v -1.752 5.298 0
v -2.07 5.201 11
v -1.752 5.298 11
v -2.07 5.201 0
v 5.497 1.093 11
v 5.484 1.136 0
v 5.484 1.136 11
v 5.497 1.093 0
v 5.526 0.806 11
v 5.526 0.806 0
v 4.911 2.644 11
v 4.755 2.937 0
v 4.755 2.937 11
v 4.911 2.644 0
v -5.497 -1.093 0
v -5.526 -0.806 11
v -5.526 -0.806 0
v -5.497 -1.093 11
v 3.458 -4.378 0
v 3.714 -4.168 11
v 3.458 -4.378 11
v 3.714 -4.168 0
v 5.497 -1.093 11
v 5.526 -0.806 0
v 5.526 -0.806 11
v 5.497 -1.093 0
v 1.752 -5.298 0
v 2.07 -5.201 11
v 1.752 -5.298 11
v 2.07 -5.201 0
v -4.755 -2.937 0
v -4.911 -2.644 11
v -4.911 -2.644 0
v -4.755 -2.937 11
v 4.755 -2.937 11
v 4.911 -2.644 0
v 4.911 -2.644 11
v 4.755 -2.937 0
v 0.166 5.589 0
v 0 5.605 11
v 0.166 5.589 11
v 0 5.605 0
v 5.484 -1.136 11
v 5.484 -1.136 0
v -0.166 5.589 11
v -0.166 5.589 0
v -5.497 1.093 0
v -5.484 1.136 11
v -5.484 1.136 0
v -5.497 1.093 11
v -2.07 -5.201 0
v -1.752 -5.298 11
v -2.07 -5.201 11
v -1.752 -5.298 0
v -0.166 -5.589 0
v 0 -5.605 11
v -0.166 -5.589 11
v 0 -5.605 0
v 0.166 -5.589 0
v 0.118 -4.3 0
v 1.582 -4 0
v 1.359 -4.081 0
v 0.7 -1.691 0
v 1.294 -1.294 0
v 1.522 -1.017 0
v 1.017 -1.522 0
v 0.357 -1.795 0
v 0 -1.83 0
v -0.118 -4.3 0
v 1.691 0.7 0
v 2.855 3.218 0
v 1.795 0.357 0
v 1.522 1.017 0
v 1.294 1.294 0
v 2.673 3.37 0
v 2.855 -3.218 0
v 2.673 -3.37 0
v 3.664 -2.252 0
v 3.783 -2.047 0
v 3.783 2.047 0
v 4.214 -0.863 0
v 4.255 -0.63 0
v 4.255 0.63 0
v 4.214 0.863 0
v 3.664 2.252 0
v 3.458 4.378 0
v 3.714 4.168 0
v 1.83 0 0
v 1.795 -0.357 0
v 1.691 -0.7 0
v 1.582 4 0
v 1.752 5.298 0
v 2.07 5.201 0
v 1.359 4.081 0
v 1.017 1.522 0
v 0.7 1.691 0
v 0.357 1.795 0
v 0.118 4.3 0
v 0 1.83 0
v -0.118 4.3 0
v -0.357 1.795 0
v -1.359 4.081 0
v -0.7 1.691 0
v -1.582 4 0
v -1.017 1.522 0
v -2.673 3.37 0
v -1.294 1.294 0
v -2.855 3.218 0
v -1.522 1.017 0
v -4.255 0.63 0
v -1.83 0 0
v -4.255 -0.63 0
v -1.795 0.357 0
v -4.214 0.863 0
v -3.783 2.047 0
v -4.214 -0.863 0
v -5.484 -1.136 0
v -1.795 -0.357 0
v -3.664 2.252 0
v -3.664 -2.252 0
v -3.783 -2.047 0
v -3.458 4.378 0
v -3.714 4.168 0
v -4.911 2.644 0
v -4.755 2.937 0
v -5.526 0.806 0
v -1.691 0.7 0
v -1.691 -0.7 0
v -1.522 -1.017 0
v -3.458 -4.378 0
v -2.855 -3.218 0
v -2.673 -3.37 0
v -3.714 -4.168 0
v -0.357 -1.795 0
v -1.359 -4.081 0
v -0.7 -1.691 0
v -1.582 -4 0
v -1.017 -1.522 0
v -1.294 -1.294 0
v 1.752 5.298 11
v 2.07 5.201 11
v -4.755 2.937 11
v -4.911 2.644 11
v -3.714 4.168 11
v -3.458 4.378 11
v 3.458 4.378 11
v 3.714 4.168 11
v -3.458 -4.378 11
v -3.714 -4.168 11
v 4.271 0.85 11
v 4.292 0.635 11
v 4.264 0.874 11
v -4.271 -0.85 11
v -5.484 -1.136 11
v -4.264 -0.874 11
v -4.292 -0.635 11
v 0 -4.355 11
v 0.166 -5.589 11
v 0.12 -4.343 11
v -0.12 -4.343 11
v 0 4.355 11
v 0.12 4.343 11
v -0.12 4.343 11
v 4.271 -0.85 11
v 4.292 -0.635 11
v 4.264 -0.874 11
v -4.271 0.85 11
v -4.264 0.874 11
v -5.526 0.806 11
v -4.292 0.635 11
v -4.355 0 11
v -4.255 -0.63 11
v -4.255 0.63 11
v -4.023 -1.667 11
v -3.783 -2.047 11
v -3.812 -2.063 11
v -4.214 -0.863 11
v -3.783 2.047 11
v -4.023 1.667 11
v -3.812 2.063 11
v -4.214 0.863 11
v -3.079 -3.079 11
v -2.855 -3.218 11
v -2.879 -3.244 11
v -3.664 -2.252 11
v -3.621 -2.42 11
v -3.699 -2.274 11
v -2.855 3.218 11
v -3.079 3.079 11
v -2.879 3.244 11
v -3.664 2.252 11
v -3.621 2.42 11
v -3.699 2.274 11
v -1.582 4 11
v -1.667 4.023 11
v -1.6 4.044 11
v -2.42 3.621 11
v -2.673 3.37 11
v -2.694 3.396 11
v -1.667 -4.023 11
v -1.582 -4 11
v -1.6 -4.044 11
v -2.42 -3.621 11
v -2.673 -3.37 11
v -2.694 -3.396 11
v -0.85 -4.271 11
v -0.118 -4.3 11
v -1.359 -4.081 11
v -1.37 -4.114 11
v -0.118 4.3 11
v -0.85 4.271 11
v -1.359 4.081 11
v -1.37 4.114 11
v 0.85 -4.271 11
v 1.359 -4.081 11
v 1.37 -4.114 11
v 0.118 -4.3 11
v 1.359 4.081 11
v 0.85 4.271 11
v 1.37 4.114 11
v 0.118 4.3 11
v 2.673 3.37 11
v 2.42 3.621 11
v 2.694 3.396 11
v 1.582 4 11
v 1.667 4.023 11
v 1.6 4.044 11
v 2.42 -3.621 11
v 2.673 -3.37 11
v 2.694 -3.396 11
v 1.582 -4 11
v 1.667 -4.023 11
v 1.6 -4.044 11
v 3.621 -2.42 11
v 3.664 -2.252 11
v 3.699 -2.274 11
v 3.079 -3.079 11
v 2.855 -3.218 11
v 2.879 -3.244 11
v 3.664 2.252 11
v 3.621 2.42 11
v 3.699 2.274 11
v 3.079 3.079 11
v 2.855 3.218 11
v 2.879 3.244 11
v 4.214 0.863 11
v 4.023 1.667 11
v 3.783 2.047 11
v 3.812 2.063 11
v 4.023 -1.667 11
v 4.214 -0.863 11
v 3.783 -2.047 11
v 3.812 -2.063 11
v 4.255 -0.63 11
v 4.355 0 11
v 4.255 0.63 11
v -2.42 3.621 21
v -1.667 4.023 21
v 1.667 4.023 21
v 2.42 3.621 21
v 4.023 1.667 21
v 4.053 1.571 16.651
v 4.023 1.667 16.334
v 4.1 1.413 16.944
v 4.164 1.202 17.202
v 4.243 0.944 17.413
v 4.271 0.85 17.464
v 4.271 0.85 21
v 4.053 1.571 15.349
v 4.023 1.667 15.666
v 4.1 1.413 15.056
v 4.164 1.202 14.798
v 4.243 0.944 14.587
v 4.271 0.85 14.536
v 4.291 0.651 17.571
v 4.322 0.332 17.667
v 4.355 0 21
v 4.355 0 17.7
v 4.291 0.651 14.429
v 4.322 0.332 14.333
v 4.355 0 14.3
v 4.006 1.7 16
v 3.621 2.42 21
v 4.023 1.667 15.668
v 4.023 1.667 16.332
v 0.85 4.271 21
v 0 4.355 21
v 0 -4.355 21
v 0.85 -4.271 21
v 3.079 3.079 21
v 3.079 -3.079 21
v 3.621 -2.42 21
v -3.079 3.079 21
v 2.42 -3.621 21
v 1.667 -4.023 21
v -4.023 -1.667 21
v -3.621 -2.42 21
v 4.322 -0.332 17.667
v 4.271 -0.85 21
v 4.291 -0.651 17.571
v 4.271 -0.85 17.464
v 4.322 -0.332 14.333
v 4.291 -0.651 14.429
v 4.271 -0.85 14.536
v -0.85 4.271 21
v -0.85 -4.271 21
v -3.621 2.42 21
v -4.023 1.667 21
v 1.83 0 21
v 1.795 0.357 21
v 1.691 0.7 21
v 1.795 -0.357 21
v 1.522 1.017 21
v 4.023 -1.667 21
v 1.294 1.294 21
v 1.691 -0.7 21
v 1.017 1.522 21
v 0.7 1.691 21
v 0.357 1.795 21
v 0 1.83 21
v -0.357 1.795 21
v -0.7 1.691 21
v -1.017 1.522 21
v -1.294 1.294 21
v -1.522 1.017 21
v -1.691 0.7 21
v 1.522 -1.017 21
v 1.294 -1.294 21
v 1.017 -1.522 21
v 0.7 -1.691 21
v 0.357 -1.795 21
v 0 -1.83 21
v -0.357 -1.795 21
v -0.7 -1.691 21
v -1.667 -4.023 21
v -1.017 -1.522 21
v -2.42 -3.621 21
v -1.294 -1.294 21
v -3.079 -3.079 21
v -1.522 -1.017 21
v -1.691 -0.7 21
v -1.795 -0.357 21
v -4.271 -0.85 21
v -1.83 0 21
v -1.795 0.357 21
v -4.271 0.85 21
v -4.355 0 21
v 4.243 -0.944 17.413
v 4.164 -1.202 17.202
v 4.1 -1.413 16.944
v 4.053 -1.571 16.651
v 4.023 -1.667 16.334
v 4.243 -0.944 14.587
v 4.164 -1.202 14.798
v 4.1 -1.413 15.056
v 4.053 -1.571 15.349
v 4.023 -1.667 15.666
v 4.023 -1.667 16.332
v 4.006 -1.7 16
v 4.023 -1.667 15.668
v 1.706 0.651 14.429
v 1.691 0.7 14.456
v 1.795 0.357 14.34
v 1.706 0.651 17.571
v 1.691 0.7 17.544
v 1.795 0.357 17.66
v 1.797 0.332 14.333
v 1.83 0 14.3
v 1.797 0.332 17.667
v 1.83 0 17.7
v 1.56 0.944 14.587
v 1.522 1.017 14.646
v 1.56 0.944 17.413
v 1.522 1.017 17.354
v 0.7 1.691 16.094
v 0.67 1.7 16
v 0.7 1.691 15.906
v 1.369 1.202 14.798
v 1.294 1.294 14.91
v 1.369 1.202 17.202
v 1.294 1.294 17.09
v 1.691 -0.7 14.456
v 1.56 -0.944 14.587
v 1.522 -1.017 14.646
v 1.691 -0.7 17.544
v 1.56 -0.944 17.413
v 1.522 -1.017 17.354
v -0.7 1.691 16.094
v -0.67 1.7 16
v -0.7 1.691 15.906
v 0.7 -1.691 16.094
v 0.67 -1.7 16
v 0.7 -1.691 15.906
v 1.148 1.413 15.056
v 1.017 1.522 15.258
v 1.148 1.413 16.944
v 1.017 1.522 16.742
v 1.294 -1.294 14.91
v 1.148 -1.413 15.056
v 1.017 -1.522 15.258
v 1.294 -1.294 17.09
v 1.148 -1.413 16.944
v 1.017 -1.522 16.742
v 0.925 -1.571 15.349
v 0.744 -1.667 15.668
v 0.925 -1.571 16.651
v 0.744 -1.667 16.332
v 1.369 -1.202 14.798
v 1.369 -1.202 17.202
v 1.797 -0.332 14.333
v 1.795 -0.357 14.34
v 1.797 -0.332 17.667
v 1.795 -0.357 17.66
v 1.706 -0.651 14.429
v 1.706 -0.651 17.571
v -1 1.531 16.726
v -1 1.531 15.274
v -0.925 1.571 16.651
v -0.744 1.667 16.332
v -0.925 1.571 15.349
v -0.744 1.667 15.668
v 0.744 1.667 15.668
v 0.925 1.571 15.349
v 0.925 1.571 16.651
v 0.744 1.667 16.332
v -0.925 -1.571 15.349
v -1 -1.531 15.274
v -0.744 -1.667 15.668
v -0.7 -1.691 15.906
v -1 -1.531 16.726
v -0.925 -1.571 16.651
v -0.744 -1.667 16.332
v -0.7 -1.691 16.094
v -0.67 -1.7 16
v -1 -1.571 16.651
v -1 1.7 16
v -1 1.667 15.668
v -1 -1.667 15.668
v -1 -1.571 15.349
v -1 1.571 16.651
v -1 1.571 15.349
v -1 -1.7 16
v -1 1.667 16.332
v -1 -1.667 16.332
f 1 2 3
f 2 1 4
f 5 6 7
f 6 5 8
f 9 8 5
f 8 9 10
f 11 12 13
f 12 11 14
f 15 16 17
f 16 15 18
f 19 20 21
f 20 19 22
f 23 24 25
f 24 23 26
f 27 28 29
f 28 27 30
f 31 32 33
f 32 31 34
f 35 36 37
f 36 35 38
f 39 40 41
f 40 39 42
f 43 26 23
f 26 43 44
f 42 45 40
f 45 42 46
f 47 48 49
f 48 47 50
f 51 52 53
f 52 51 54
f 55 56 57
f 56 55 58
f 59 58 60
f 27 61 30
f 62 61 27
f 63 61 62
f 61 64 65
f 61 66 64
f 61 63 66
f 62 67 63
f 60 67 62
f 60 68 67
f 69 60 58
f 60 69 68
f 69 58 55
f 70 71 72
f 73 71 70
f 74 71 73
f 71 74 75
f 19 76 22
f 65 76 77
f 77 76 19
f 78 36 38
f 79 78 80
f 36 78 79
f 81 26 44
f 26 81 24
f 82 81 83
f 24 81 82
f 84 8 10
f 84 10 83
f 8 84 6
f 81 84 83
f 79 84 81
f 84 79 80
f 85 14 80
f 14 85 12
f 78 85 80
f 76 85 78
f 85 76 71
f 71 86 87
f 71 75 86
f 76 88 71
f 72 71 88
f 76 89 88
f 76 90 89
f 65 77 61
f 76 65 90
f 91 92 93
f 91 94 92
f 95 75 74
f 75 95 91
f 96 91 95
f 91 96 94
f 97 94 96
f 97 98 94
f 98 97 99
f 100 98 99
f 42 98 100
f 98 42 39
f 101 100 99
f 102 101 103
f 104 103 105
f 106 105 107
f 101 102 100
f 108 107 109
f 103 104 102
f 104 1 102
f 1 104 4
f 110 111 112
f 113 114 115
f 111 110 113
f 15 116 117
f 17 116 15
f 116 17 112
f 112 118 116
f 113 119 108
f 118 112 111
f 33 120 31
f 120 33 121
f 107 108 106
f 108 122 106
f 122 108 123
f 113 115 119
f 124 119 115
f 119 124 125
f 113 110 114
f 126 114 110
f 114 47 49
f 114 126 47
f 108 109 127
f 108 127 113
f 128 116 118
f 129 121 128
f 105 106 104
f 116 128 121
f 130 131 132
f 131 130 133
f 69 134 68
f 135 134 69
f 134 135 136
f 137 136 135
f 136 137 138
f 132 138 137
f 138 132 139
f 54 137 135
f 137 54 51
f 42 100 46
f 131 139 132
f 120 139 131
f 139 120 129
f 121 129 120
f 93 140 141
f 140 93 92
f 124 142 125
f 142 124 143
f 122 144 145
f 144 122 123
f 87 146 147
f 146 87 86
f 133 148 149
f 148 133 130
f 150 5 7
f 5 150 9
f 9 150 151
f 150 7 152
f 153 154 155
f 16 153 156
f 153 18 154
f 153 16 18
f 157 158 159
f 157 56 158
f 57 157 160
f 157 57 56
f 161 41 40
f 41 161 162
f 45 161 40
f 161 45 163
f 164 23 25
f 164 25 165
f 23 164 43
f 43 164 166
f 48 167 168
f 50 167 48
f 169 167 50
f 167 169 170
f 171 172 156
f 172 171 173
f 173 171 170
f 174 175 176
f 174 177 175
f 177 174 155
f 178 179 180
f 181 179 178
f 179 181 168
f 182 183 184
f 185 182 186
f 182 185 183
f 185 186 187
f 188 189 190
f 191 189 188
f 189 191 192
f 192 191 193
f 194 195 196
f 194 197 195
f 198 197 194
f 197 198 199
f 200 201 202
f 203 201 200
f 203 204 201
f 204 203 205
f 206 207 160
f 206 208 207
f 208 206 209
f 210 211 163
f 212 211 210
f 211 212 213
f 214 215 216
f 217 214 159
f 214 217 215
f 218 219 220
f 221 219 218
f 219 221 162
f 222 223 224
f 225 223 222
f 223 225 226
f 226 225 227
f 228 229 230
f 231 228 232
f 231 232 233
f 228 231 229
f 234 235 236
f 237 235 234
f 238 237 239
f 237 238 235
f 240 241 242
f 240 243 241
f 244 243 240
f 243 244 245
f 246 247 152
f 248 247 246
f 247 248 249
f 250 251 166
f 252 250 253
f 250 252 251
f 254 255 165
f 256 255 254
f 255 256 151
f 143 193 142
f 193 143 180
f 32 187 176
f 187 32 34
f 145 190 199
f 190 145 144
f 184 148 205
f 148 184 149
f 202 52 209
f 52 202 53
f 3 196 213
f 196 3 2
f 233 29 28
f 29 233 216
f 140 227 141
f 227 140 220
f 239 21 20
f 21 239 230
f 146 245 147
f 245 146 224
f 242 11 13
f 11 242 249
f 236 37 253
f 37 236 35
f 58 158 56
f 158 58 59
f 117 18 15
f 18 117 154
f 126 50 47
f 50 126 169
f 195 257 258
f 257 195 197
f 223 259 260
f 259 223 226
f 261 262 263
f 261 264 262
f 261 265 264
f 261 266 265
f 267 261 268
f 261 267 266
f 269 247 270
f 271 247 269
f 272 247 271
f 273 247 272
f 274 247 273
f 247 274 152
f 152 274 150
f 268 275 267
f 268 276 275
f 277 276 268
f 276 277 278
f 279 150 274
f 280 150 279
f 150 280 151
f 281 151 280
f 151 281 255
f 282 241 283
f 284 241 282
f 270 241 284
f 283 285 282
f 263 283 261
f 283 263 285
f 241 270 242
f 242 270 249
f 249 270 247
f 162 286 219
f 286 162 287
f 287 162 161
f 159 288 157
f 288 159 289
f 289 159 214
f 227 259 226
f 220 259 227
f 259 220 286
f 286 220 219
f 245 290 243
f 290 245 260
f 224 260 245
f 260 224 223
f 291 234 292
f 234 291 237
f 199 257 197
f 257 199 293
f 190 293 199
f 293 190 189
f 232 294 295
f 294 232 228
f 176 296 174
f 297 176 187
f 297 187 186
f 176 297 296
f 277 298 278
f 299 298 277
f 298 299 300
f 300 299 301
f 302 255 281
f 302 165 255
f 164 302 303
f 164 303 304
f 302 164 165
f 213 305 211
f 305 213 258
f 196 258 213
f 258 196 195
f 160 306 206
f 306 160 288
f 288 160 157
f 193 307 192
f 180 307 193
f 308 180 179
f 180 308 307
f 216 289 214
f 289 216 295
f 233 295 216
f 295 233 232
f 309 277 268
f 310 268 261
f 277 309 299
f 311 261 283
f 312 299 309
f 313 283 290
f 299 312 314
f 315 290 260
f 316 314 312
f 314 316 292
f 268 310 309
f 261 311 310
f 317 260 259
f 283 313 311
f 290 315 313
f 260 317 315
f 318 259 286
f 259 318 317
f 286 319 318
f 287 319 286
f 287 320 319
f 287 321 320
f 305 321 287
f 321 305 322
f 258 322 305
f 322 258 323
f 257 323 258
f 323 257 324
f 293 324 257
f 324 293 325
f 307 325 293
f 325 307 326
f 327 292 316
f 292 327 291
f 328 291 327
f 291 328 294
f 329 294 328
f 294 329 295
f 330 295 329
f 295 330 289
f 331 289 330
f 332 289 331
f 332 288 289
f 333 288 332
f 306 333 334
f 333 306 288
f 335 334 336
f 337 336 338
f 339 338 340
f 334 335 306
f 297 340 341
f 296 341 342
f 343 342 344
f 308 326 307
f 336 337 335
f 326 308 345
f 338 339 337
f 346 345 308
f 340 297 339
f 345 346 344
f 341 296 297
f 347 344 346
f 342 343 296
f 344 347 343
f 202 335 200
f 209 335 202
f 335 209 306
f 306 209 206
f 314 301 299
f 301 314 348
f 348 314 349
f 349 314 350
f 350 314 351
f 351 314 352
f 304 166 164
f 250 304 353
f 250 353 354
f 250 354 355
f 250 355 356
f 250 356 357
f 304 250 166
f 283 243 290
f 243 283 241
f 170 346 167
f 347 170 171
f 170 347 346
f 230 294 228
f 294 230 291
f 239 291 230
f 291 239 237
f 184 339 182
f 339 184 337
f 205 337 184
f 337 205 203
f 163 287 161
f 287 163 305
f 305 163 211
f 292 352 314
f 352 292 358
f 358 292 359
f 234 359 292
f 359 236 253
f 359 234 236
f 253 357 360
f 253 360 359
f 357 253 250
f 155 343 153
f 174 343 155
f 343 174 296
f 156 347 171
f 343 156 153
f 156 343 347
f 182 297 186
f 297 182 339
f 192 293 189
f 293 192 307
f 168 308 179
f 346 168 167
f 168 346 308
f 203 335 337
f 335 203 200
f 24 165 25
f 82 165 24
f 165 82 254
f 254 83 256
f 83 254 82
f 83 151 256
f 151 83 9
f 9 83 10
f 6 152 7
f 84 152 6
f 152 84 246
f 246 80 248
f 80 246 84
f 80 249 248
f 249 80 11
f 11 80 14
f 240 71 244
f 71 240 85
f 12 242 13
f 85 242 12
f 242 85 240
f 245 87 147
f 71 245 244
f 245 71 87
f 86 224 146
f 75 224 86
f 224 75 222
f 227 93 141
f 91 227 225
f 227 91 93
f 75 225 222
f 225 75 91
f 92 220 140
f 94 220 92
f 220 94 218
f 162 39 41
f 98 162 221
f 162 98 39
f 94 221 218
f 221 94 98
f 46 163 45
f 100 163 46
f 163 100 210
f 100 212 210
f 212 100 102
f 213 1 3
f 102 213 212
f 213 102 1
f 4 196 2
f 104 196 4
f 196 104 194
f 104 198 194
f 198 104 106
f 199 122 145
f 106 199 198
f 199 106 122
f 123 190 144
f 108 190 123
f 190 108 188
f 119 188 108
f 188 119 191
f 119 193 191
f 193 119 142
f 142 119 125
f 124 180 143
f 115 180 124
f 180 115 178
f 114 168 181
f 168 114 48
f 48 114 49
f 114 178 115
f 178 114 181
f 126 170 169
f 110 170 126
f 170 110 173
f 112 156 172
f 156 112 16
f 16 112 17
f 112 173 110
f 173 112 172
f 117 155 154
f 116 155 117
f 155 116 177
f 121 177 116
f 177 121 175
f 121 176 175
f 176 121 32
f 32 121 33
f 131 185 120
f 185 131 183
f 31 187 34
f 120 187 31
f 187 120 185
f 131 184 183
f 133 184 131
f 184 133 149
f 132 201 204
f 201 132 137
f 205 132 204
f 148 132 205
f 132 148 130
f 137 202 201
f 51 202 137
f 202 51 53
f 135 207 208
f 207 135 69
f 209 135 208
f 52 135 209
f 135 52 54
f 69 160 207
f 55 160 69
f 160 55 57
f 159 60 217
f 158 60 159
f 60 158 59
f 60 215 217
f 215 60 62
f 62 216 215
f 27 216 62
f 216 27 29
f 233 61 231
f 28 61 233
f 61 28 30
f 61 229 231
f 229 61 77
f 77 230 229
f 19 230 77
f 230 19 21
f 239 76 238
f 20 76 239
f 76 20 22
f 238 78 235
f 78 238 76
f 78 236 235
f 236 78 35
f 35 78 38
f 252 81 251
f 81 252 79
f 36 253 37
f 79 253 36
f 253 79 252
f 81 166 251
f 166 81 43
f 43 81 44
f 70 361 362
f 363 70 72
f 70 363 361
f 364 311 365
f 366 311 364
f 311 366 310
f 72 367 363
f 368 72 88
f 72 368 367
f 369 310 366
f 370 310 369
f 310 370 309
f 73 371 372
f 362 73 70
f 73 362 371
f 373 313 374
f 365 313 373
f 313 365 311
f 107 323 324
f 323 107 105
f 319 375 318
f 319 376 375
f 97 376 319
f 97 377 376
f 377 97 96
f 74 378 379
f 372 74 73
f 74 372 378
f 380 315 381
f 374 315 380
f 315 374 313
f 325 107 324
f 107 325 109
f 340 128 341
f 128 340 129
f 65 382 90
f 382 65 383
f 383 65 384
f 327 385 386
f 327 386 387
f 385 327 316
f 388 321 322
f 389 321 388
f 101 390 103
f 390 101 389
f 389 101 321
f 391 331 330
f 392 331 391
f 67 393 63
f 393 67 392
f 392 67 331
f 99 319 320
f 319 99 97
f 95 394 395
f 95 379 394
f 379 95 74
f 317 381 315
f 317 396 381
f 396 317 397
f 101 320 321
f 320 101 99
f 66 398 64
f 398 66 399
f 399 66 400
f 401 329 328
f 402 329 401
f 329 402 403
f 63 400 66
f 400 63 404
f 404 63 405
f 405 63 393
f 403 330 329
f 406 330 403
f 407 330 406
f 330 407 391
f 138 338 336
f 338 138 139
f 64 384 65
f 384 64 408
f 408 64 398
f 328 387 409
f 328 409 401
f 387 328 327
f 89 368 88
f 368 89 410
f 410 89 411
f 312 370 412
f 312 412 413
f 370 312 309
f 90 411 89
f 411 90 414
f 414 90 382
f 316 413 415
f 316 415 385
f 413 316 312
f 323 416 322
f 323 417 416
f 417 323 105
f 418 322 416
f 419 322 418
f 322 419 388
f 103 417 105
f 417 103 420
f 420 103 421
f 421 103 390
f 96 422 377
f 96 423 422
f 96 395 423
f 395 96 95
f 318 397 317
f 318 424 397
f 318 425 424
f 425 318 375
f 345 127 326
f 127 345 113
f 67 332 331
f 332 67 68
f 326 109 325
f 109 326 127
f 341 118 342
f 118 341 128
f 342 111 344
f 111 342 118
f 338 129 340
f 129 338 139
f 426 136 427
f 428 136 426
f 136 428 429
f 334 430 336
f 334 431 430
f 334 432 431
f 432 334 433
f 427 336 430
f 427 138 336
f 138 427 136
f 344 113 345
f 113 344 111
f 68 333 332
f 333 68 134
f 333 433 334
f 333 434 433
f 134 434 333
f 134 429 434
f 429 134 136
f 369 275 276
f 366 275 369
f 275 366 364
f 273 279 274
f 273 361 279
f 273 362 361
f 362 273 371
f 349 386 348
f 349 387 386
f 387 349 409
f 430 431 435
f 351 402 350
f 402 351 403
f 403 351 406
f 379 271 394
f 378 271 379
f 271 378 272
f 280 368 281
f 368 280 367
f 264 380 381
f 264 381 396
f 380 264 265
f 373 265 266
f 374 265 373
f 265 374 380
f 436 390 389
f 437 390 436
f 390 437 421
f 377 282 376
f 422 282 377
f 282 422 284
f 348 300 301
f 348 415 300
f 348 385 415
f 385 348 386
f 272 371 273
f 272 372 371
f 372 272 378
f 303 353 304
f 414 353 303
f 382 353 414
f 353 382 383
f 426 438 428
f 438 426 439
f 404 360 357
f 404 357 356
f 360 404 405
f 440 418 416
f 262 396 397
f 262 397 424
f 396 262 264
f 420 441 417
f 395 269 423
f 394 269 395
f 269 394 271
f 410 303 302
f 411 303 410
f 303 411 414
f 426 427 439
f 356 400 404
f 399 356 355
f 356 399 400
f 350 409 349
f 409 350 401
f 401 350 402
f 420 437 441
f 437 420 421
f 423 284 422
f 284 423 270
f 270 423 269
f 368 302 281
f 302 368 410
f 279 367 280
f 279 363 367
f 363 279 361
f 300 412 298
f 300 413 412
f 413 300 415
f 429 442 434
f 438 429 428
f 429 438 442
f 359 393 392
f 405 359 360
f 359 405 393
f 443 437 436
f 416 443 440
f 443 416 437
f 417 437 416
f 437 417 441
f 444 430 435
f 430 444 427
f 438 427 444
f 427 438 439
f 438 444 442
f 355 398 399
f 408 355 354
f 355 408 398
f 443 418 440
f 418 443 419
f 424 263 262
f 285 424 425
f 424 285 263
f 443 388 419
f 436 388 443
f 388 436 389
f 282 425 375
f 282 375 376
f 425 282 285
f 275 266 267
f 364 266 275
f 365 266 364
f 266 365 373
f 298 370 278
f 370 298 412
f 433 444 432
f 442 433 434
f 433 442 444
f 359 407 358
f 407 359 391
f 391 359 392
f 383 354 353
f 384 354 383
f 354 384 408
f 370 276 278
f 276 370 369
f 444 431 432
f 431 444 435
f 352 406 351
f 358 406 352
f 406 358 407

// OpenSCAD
$fn = 32;

// ----------------------------------------------------------------------
// Timing pulley: GT2 18T, pitch 2 mm, 11.21 mm x 21 mm
// ----------------------------------------------------------------------

// --- parameters (mm) ---
pitch_mm = 2;             // belt pitch
tooth_count = 18;         // number of grooves
width = 11;               // belt width between the flanges
tip_d = 11.21;            // tip circle diameter
root_d = 9.71;            // groove bottom diameter
groove_h = 0.75;          // groove depth
tooth_w = 1.5;            // groove width at the tip circle
hub_bore = 3.66;          // shaft bore
hub_d = 8.71;             // hub diameter
hub_h = 10;               // hub above the flange
bottom_z = 0;             // lowest point of the pulley
top_z = 21;               // highest point of the pulley
set_d = 3.4;              // set screw tap hole

module rim() {
  cylinder(h = width, d = tip_d);
}

module groove_cutter() {
  /* belt tooth groove: deeper than wide, cut through the belt width */
  translate([root_d / 2, 0, 0])
    linear_extrude(height = width)
      polygon(points = [[-0.6, -tooth_w * 0.42], [groove_h + 0.6, -tooth_w * 0.6],
                        [groove_h + 0.6, tooth_w * 0.6], [-0.6, tooth_w * 0.42]]);
}

module hub() {
  translate([0, 0, bottom_z]) cylinder(h = top_z - bottom_z, d = hub_d);
}

difference() {
  union() {
    rim();
    hub();
  }
  for (i = [0 : tooth_count - 1]) rotate([0, 0, i * 360 / tooth_count]) groove_cutter();
  translate([0, 0, bottom_z - 1]) cylinder(h = top_z - bottom_z + 2, d = hub_bore);
  translate([-1, 0, top_z - hub_h * 0.5]) rotate([0, 90, 0]) cylinder(h = hub_d / 2 + 3, d = set_d);
}
